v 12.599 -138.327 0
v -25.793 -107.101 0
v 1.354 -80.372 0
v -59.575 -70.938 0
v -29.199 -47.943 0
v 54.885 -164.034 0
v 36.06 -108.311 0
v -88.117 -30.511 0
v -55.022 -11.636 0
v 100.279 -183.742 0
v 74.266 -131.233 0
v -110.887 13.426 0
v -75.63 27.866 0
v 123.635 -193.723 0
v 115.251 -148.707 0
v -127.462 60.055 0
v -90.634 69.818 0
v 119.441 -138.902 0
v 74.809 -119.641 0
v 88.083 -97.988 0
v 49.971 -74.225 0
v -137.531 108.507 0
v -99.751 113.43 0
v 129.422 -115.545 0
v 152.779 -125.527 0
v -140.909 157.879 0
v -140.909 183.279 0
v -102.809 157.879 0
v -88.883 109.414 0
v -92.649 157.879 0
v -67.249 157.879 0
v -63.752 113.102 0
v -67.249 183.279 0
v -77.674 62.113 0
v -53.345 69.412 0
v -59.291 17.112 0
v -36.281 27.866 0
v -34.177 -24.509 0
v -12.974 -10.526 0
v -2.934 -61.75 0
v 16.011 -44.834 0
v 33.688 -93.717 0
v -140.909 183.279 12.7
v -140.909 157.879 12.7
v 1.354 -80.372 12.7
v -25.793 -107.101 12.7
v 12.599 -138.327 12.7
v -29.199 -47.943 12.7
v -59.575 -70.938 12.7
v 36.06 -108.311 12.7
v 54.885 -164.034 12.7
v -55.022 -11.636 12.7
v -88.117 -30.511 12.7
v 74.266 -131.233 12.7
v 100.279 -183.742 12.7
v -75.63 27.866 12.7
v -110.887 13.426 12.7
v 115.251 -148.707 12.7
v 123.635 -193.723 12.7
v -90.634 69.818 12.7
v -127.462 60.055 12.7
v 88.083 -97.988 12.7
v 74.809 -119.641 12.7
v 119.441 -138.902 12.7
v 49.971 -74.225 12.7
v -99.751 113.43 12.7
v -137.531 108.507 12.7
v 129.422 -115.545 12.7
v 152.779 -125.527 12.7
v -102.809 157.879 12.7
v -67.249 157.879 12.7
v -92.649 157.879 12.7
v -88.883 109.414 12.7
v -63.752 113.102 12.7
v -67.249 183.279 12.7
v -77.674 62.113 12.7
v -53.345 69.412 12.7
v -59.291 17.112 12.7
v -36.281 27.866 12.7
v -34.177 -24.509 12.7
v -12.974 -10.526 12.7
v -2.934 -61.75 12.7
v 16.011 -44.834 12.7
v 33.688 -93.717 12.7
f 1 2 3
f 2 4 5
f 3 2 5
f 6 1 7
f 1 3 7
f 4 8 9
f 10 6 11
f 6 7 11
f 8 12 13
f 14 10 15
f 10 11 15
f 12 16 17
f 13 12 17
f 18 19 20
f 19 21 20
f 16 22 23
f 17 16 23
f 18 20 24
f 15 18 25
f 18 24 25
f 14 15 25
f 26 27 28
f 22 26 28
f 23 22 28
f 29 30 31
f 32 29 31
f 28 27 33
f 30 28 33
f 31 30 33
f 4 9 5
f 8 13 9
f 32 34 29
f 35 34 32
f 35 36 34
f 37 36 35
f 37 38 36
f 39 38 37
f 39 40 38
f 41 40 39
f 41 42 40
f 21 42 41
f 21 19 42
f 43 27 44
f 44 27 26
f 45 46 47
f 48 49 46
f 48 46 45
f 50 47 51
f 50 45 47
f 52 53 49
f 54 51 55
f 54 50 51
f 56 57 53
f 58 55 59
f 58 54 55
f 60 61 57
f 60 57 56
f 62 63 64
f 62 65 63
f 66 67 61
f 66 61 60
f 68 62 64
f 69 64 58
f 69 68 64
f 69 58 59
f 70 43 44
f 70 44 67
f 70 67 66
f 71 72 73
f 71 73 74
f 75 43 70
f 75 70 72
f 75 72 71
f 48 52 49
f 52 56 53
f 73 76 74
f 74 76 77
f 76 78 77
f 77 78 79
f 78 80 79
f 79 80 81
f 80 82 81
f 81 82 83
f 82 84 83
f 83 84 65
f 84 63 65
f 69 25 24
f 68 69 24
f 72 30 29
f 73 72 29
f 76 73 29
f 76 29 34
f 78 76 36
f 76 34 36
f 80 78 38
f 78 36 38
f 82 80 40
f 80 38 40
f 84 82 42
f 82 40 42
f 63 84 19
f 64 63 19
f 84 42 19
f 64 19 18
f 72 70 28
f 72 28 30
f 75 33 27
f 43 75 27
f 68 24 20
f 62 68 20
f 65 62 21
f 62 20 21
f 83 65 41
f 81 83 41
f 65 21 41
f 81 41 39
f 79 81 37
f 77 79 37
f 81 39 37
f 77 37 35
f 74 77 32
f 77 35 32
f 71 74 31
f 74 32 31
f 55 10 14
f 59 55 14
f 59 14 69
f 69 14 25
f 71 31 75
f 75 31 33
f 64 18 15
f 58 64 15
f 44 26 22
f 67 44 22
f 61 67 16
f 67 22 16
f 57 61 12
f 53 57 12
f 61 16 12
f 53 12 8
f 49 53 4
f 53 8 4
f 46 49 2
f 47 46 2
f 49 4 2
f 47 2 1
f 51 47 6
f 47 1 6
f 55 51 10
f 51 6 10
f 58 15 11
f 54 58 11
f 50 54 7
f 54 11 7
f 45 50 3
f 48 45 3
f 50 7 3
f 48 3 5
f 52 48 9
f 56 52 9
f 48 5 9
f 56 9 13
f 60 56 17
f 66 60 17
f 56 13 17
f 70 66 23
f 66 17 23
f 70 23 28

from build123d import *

# Parameters (mm, degrees)
F1_DEPTH = 12.7


with BuildPart() as f1:
    # F0 (on Top) → F1 (new body)
    with BuildSketch(Plane.XY):
        with BuildLine():
            ThreePointArc((129.422316, -115.545373), (-12.974184, -10.525769), (-67.249111, 157.878841))
            Line((-67.249111, 157.878841), (-67.249111, 183.278841))
            Line((-67.249111, 183.278841), (-140.909111, 183.278841))
            Line((-140.909111, 183.278841), (-140.909111, 157.878841))
            ThreePointArc((-140.909111, 157.878841), (-74.536341, -51.212117), (100.278697, -183.741644))
            Line((100.278697, -183.741644), (123.635304, -193.723071))
            Line((123.635304, -193.723071), (152.778923, -125.5268))
            Line((152.778923, -125.5268), (129.422316, -115.545373))
        make_face()
        with BuildLine():
            Line((-102.809111, 157.878841), (-92.649111, 157.878841))
            ThreePointArc((-92.649111, 157.878841), (-34.176979, -24.508812), (119.440889, -138.901981))
            Line((119.440889, -138.901981), (115.250837, -148.706732))
            ThreePointArc((115.250837, -148.706732), (-42.734212, -30.233396), (-102.809111, 157.878841))
        make_face(mode=Mode.SUBTRACT)
    extrude(amount=F1_DEPTH)


solid = f1.part
